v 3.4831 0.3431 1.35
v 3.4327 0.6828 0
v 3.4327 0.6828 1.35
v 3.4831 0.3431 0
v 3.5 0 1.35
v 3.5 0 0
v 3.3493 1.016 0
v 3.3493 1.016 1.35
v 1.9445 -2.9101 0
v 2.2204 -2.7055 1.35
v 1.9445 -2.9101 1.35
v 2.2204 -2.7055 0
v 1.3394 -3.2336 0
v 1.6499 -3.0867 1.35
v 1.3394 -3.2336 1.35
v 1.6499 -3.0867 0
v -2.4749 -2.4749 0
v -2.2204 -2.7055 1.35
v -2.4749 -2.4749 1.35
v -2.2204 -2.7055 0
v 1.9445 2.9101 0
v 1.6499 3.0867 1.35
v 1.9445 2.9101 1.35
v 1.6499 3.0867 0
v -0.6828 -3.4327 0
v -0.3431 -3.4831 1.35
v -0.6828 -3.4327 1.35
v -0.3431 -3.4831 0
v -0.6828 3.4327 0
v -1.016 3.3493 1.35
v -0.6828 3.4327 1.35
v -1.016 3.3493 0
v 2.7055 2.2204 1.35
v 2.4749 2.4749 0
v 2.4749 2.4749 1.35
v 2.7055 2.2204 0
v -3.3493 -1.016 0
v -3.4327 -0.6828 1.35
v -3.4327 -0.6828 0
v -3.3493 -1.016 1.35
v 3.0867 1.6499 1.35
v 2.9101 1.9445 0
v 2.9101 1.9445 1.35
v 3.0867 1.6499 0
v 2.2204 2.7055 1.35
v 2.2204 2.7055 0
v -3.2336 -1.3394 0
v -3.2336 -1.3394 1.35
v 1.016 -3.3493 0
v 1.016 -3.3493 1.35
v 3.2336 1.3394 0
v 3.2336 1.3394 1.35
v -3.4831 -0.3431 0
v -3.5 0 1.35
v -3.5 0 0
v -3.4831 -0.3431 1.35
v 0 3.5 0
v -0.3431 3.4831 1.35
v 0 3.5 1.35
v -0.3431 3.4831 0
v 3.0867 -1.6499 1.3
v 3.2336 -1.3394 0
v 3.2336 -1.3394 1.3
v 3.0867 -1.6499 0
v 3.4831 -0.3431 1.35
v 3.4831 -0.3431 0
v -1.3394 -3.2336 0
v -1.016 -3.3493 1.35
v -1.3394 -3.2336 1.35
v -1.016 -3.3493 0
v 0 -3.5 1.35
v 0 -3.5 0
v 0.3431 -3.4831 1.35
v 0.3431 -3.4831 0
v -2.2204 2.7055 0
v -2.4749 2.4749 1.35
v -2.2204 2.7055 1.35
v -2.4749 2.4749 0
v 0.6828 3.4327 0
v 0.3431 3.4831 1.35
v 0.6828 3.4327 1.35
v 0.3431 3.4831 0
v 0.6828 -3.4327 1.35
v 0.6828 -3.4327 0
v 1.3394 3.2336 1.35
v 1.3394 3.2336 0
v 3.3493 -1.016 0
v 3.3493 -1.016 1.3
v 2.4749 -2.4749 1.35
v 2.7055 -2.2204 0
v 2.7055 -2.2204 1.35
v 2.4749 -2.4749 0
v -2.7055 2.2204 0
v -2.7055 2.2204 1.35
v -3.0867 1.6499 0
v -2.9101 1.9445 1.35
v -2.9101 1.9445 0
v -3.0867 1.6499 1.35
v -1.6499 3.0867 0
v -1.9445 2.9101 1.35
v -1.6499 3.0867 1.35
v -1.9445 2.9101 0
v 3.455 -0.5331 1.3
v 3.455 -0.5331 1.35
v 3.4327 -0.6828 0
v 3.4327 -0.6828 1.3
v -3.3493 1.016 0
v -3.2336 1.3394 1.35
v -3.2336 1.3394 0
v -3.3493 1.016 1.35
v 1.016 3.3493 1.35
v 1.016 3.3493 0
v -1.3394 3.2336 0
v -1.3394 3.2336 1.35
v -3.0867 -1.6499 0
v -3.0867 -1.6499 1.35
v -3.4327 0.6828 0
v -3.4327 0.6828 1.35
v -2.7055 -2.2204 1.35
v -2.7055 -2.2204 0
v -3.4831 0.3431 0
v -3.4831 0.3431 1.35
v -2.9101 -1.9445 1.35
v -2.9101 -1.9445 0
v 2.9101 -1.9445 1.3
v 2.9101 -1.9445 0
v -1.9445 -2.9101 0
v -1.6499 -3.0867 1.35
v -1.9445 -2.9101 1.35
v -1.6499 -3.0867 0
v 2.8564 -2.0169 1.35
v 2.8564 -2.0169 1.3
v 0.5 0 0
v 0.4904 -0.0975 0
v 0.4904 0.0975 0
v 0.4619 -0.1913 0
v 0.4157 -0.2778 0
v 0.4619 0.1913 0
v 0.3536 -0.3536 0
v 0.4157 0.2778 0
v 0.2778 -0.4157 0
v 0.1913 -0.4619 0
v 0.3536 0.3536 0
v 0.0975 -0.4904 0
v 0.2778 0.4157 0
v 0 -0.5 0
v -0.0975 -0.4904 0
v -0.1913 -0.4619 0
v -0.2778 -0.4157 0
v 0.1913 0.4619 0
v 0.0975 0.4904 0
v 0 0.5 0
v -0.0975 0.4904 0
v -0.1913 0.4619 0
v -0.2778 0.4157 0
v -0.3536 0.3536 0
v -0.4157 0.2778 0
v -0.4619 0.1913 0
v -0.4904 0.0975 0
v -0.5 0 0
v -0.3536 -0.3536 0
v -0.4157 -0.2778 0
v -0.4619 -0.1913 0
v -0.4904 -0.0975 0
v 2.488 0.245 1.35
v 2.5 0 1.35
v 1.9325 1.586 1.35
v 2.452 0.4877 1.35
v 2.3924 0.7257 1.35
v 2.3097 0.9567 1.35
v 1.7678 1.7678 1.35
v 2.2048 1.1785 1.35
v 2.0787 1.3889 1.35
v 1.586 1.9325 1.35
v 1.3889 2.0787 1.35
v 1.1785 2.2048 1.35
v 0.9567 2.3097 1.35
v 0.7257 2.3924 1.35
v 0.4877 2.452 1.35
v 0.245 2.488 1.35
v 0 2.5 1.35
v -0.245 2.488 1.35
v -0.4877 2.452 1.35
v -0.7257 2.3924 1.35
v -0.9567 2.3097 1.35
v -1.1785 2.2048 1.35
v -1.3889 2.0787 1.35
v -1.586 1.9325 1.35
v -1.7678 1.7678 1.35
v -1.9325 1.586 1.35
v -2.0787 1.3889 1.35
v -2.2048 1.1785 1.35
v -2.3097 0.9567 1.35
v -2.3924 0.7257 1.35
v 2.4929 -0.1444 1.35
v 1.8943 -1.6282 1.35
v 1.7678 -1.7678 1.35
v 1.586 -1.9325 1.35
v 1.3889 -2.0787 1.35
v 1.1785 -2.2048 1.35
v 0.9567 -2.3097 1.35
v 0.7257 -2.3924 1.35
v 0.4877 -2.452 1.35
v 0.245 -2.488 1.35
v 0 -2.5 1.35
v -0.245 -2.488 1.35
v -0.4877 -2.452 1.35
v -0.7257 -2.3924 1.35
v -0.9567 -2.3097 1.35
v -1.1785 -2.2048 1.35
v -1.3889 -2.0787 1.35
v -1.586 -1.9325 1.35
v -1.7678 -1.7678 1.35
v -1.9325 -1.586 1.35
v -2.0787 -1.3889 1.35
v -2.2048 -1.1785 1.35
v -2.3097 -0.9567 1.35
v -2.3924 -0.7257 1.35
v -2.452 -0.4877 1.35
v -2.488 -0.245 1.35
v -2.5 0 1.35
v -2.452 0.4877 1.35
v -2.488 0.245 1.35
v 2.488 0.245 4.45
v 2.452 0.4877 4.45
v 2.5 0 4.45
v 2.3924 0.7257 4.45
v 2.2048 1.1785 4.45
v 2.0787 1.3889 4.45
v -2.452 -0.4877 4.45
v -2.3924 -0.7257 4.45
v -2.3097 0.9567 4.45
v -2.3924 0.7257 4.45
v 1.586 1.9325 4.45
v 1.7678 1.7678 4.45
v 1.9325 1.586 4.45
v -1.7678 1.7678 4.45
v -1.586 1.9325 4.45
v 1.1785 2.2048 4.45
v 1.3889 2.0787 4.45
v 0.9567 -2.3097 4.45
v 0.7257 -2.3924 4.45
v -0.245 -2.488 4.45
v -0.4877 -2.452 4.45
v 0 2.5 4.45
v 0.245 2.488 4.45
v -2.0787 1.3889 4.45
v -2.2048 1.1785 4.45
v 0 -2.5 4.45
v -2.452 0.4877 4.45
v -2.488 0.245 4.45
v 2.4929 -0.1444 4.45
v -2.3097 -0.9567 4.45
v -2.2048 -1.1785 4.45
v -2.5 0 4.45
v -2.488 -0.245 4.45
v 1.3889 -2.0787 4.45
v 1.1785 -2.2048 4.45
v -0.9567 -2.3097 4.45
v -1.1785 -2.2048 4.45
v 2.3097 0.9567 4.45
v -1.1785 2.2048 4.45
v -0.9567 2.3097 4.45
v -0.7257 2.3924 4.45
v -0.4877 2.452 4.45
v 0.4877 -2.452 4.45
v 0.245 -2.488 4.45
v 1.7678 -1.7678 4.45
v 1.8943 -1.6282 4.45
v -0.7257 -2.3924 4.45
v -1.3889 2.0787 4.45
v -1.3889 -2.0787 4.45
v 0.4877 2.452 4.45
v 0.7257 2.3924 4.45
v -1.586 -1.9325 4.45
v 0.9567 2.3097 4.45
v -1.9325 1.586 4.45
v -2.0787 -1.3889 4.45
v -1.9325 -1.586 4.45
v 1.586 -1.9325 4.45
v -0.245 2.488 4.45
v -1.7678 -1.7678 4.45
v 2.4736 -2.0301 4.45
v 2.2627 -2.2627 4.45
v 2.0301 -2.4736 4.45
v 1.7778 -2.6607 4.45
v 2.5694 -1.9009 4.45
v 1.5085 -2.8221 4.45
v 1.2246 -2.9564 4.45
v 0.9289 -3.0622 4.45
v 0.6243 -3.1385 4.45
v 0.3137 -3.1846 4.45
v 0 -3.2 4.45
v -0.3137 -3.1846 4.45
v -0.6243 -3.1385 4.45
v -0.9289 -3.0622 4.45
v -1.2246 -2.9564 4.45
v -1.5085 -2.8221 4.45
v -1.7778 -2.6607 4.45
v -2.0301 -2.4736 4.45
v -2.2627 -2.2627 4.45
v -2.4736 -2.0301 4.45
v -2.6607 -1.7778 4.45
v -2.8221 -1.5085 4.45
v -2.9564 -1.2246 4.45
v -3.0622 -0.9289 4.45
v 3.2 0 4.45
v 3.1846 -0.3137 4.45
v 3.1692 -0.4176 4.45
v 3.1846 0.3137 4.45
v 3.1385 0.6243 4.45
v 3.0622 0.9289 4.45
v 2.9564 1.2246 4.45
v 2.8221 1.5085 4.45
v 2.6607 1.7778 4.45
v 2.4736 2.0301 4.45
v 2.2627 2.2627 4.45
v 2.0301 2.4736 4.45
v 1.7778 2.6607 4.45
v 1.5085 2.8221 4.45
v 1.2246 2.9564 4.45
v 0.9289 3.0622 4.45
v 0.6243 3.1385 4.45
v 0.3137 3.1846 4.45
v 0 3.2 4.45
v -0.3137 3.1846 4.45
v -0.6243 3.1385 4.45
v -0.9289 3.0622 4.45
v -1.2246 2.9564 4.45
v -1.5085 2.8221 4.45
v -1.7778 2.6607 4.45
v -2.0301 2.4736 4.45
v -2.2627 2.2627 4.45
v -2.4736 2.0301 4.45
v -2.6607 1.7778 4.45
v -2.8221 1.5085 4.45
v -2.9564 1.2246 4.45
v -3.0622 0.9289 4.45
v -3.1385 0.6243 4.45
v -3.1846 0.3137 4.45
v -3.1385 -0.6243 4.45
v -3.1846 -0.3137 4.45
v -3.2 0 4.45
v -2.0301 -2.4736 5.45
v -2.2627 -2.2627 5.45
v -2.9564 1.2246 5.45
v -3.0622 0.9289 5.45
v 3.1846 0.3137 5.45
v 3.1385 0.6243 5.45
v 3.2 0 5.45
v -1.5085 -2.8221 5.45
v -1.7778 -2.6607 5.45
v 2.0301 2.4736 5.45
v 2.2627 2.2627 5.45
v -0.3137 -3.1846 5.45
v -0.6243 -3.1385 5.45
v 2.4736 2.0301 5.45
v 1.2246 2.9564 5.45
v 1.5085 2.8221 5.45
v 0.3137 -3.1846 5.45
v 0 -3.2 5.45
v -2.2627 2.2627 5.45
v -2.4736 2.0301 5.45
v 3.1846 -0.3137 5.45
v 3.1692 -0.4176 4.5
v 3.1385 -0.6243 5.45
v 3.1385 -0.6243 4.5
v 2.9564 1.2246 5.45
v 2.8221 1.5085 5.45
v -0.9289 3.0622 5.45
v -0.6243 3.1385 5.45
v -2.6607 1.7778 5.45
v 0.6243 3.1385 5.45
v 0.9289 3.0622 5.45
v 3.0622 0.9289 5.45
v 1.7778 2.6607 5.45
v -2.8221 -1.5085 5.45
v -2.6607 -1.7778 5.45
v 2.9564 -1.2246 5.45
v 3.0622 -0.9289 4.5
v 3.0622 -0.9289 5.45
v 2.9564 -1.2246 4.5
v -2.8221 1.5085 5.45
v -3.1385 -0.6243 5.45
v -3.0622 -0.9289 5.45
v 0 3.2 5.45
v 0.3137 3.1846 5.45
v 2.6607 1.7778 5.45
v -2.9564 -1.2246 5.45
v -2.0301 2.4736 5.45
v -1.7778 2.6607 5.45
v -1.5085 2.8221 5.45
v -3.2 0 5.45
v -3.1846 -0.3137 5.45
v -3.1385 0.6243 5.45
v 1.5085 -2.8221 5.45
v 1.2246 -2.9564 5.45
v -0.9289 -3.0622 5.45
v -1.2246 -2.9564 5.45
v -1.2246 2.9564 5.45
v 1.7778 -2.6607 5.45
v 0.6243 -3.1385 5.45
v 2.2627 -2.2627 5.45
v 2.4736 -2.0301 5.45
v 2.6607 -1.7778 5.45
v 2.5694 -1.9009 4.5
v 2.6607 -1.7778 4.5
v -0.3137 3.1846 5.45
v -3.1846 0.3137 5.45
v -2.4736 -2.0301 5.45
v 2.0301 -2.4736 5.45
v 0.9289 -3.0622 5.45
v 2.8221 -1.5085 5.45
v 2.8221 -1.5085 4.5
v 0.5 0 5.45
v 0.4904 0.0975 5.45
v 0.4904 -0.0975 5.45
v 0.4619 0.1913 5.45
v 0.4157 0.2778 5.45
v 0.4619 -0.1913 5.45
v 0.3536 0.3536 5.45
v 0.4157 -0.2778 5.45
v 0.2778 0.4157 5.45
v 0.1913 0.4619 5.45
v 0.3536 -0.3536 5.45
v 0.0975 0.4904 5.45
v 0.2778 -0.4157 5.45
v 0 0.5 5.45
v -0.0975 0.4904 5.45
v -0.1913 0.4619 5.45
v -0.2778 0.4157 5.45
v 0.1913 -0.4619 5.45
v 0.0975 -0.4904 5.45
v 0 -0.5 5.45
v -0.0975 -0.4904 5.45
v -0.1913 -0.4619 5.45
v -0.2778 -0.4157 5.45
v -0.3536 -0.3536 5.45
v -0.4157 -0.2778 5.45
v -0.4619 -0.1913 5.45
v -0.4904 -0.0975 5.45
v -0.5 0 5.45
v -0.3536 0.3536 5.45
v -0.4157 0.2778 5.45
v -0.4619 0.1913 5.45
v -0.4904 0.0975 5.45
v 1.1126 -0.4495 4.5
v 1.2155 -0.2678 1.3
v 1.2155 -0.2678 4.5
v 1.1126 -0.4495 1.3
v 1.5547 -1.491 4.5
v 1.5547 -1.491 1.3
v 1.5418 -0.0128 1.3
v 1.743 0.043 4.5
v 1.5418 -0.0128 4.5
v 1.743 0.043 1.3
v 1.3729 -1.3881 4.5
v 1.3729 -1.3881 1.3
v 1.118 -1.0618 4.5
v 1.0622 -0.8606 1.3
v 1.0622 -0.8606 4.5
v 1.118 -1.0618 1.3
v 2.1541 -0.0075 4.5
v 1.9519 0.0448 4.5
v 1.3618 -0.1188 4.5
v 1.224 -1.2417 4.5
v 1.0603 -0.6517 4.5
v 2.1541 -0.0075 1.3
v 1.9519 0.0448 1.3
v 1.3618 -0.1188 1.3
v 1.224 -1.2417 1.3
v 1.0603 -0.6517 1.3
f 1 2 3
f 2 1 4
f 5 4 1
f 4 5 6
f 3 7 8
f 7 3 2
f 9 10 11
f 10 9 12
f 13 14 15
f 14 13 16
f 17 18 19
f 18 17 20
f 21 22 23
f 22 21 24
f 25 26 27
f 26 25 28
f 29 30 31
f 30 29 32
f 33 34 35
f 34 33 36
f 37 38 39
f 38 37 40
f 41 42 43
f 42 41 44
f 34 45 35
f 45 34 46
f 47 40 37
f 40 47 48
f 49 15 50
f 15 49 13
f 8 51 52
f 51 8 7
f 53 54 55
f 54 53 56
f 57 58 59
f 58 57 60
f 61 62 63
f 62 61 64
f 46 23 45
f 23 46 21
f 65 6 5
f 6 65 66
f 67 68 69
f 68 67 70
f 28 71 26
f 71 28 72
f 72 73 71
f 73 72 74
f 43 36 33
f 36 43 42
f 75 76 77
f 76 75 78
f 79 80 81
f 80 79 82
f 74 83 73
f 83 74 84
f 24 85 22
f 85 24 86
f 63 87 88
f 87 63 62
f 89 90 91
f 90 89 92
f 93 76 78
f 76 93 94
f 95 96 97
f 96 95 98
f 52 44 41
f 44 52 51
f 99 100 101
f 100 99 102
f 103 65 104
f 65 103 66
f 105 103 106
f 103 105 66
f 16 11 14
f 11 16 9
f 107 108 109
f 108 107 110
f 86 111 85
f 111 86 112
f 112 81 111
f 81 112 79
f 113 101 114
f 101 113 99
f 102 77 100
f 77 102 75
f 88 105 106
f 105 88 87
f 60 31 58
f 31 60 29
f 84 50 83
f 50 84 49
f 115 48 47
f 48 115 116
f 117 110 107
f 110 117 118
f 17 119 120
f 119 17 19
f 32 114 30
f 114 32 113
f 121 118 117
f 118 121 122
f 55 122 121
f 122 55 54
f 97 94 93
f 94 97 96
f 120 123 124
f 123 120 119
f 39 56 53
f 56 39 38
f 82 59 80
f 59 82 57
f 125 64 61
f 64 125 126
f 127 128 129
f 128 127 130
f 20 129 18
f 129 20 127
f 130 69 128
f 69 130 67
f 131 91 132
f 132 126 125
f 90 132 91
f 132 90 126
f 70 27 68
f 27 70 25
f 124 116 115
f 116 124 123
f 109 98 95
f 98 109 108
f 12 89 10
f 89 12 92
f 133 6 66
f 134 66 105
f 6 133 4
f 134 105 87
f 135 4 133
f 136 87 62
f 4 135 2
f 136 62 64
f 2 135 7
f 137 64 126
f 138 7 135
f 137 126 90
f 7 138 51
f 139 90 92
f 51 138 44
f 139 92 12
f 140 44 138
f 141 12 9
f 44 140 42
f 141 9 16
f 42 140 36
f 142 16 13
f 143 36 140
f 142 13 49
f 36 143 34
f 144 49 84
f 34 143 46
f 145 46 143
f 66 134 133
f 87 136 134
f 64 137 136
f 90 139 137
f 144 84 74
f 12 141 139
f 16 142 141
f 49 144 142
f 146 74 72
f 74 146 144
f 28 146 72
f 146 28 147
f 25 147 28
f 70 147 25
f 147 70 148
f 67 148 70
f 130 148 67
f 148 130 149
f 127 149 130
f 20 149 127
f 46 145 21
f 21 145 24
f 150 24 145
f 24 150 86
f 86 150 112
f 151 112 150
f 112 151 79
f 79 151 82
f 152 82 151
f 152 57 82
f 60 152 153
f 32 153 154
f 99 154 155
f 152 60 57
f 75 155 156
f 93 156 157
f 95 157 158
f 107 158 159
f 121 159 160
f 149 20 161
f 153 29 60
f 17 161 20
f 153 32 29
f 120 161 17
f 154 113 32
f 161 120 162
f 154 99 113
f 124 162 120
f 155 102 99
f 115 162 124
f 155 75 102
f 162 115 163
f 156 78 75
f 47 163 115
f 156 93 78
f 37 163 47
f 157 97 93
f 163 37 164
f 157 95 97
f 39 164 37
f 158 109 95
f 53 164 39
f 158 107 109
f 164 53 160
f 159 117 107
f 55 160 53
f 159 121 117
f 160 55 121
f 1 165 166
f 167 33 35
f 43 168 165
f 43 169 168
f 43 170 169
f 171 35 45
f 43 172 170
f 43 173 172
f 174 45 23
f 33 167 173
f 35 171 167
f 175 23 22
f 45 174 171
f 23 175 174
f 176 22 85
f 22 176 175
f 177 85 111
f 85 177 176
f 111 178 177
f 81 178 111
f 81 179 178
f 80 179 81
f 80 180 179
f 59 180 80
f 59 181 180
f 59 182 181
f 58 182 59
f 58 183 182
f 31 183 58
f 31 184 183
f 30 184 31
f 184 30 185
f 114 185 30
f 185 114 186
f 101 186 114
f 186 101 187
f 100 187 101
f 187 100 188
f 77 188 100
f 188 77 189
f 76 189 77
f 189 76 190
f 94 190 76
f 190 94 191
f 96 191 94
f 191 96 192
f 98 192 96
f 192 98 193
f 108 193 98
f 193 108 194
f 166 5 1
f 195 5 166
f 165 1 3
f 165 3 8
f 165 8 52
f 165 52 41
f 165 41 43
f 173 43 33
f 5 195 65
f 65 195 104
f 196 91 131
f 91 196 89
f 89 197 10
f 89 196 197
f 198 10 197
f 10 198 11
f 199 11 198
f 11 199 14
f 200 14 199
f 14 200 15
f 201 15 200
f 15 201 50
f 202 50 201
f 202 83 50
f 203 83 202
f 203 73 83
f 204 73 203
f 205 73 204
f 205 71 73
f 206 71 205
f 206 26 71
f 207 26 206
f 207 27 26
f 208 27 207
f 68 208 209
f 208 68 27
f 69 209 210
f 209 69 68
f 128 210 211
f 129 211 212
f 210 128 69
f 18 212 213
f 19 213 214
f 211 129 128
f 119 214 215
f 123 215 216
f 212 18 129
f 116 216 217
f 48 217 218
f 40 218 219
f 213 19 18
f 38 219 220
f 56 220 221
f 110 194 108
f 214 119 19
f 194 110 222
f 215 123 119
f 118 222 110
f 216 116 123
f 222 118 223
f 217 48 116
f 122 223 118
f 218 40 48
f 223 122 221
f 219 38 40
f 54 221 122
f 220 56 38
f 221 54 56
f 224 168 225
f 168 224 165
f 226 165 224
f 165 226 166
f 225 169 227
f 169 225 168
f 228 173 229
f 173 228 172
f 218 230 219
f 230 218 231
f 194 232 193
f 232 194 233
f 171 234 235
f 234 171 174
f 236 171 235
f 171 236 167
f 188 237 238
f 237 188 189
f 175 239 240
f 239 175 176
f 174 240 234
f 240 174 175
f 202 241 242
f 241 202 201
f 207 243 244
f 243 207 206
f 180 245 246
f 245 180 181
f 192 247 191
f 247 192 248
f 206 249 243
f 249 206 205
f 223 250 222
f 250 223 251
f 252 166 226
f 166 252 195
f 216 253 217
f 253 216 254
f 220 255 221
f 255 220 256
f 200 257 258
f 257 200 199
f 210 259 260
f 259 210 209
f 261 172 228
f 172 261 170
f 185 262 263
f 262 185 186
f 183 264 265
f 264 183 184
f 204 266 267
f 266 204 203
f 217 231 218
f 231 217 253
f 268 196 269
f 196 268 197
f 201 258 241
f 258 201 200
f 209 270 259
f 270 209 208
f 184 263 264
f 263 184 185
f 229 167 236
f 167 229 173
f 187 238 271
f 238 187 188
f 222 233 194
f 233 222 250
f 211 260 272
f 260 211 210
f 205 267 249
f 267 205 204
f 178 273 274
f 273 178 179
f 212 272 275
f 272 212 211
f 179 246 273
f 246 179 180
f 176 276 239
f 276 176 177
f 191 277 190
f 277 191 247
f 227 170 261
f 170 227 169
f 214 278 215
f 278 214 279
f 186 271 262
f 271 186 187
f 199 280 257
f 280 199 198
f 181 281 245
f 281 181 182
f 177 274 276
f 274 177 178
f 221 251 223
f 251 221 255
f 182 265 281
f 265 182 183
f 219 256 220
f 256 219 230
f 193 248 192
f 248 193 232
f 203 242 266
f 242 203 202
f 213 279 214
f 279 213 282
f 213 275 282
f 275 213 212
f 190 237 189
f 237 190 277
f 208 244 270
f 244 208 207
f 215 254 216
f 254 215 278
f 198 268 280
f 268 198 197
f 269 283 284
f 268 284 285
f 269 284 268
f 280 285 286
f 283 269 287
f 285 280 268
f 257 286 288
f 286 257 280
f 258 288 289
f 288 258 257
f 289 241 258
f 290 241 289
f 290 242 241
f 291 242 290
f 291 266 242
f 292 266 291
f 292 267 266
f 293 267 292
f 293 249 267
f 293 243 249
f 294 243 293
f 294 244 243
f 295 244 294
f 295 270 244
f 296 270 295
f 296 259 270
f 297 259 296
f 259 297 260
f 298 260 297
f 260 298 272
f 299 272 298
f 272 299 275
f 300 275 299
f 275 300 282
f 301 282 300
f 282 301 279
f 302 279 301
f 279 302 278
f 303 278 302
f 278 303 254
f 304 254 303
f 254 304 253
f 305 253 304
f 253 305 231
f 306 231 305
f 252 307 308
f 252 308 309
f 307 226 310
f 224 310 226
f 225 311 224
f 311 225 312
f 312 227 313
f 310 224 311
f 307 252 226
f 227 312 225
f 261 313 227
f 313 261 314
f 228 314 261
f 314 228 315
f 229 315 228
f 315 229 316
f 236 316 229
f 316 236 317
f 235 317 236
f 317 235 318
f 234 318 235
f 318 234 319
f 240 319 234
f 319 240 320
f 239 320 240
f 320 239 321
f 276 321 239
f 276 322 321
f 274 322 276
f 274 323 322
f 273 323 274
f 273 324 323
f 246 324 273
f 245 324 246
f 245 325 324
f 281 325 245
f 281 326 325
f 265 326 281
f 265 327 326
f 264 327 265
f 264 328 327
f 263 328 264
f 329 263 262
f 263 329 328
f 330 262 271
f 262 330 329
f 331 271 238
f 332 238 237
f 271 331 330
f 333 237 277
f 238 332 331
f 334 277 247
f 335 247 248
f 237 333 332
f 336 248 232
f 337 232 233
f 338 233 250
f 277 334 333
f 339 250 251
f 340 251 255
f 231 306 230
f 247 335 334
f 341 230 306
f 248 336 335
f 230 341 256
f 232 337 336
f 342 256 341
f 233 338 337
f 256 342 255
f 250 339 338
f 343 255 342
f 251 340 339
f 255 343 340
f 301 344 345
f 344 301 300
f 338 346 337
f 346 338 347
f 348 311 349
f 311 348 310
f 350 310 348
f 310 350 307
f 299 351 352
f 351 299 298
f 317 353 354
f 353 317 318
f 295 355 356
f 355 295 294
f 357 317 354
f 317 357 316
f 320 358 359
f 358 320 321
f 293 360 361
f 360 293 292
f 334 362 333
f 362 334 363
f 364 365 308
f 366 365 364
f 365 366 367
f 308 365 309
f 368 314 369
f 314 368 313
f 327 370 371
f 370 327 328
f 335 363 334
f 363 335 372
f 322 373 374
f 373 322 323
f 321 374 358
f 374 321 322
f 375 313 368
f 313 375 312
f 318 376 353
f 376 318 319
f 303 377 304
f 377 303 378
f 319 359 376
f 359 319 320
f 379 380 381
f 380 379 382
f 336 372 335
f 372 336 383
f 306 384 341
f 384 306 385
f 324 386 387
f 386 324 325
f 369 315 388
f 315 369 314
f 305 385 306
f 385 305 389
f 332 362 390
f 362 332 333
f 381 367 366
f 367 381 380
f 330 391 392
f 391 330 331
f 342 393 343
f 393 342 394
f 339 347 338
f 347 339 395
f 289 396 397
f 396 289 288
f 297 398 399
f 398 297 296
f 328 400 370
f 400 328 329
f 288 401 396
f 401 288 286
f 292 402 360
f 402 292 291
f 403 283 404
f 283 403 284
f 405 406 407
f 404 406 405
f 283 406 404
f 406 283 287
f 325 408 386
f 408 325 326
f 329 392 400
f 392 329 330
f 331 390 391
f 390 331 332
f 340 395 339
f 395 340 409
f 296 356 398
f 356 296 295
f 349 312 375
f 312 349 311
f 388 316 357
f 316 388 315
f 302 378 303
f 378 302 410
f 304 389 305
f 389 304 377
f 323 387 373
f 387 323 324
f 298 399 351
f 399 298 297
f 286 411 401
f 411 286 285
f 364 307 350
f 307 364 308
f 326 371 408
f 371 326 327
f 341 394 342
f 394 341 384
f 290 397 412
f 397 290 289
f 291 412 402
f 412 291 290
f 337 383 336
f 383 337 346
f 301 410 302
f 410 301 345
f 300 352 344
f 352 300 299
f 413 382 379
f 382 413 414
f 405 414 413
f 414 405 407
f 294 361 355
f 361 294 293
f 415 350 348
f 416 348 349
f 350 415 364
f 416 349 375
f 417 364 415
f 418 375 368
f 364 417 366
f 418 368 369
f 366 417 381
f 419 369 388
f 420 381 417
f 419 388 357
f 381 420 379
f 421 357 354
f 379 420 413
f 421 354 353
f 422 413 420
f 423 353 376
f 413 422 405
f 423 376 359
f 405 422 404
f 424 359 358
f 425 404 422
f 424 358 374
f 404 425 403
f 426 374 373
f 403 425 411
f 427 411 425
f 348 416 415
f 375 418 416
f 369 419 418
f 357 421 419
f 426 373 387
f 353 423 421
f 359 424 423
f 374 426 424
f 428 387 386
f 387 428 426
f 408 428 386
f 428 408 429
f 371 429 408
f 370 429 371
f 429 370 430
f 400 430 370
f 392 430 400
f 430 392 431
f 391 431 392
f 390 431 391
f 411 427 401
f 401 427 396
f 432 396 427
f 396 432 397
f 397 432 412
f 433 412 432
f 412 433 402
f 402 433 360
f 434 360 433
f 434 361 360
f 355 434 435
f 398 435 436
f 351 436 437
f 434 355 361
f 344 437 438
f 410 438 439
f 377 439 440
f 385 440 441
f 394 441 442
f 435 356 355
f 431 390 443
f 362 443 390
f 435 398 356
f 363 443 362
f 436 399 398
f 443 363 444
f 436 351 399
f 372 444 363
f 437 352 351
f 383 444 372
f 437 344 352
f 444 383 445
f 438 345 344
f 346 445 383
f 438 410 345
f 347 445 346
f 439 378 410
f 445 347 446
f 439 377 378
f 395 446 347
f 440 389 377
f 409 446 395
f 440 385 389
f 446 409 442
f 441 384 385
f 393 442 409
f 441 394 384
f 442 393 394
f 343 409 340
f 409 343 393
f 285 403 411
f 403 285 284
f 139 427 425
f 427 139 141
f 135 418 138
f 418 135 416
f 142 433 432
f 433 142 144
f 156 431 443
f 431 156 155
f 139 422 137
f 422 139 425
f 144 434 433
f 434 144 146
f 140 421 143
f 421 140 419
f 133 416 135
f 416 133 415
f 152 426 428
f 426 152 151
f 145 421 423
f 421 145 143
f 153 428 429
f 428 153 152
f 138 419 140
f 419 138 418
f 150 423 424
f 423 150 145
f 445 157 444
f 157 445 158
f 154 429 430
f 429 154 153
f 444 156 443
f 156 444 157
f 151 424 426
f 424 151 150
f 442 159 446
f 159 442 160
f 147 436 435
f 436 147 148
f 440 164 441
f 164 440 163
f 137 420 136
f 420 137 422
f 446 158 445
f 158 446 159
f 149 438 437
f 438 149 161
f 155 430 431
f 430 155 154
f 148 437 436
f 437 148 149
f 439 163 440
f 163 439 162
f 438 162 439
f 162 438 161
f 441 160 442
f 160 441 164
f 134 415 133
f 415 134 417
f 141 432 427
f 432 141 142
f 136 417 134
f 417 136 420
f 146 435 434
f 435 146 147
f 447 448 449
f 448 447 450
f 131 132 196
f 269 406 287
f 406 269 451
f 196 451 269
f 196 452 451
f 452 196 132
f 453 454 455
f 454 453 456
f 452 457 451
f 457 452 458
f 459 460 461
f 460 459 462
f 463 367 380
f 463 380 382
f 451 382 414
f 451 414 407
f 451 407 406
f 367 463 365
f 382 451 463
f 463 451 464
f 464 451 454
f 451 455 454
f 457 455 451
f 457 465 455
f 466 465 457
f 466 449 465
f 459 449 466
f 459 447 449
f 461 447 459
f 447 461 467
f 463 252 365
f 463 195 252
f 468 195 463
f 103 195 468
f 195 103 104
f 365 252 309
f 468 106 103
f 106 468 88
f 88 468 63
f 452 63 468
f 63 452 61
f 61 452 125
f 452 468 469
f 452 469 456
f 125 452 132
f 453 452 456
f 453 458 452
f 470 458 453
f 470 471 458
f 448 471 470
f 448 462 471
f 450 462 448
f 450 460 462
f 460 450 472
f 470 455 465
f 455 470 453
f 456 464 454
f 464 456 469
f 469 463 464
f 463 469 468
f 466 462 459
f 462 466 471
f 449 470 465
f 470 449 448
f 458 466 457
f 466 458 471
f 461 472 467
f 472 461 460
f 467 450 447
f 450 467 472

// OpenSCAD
// part_id: jup7
// name: Jupiter stepped hub
// source_drawing_ids: DRW-012
// units: mm
// revision: 0.1
// SPDX-License-Identifier: MIT

module part_jup7(
    base_d = 7.0,
    body_d = 5.0,
    top_d = 6.4,
    h1 = 1.35,
    h2 = 3.10,
    h3 = 1.0,
    center_d = 1.0,
    slot_w = 1.6,
    slot_l = 3.2,
    slot_r = 2.0,
    slot_a = -22
) {
    total_h = h1 + h2 + h3;
    difference() {
        union() {
            cylinder(d = base_d, h = h1, center = false, $fn = 64);
            translate([0, 0, h1]) cylinder(d = body_d, h = h2, center = false, $fn = 64);
            translate([0, 0, h1 + h2]) cylinder(d = top_d, h = h3, center = false, $fn = 64);
        }
        translate([0, 0, -0.05]) cylinder(d = center_d, h = total_h + 0.1, $fn = 32);
        rotate([0, 0, slot_a]) translate([slot_r, 0, h1 - 0.05]) hull() {
            cylinder(d = slot_w, h = h2 + 0.1, $fn = 24);
            translate([slot_l, 0, 0]) cylinder(d = slot_w, h = h2 + 0.1, $fn = 24);
        }
    }
}

// ---- "main guard" ----
// Default to previewing when opened directly:
if (is_undef(__LIB_MODE__)) {
    part_jup7();
}
